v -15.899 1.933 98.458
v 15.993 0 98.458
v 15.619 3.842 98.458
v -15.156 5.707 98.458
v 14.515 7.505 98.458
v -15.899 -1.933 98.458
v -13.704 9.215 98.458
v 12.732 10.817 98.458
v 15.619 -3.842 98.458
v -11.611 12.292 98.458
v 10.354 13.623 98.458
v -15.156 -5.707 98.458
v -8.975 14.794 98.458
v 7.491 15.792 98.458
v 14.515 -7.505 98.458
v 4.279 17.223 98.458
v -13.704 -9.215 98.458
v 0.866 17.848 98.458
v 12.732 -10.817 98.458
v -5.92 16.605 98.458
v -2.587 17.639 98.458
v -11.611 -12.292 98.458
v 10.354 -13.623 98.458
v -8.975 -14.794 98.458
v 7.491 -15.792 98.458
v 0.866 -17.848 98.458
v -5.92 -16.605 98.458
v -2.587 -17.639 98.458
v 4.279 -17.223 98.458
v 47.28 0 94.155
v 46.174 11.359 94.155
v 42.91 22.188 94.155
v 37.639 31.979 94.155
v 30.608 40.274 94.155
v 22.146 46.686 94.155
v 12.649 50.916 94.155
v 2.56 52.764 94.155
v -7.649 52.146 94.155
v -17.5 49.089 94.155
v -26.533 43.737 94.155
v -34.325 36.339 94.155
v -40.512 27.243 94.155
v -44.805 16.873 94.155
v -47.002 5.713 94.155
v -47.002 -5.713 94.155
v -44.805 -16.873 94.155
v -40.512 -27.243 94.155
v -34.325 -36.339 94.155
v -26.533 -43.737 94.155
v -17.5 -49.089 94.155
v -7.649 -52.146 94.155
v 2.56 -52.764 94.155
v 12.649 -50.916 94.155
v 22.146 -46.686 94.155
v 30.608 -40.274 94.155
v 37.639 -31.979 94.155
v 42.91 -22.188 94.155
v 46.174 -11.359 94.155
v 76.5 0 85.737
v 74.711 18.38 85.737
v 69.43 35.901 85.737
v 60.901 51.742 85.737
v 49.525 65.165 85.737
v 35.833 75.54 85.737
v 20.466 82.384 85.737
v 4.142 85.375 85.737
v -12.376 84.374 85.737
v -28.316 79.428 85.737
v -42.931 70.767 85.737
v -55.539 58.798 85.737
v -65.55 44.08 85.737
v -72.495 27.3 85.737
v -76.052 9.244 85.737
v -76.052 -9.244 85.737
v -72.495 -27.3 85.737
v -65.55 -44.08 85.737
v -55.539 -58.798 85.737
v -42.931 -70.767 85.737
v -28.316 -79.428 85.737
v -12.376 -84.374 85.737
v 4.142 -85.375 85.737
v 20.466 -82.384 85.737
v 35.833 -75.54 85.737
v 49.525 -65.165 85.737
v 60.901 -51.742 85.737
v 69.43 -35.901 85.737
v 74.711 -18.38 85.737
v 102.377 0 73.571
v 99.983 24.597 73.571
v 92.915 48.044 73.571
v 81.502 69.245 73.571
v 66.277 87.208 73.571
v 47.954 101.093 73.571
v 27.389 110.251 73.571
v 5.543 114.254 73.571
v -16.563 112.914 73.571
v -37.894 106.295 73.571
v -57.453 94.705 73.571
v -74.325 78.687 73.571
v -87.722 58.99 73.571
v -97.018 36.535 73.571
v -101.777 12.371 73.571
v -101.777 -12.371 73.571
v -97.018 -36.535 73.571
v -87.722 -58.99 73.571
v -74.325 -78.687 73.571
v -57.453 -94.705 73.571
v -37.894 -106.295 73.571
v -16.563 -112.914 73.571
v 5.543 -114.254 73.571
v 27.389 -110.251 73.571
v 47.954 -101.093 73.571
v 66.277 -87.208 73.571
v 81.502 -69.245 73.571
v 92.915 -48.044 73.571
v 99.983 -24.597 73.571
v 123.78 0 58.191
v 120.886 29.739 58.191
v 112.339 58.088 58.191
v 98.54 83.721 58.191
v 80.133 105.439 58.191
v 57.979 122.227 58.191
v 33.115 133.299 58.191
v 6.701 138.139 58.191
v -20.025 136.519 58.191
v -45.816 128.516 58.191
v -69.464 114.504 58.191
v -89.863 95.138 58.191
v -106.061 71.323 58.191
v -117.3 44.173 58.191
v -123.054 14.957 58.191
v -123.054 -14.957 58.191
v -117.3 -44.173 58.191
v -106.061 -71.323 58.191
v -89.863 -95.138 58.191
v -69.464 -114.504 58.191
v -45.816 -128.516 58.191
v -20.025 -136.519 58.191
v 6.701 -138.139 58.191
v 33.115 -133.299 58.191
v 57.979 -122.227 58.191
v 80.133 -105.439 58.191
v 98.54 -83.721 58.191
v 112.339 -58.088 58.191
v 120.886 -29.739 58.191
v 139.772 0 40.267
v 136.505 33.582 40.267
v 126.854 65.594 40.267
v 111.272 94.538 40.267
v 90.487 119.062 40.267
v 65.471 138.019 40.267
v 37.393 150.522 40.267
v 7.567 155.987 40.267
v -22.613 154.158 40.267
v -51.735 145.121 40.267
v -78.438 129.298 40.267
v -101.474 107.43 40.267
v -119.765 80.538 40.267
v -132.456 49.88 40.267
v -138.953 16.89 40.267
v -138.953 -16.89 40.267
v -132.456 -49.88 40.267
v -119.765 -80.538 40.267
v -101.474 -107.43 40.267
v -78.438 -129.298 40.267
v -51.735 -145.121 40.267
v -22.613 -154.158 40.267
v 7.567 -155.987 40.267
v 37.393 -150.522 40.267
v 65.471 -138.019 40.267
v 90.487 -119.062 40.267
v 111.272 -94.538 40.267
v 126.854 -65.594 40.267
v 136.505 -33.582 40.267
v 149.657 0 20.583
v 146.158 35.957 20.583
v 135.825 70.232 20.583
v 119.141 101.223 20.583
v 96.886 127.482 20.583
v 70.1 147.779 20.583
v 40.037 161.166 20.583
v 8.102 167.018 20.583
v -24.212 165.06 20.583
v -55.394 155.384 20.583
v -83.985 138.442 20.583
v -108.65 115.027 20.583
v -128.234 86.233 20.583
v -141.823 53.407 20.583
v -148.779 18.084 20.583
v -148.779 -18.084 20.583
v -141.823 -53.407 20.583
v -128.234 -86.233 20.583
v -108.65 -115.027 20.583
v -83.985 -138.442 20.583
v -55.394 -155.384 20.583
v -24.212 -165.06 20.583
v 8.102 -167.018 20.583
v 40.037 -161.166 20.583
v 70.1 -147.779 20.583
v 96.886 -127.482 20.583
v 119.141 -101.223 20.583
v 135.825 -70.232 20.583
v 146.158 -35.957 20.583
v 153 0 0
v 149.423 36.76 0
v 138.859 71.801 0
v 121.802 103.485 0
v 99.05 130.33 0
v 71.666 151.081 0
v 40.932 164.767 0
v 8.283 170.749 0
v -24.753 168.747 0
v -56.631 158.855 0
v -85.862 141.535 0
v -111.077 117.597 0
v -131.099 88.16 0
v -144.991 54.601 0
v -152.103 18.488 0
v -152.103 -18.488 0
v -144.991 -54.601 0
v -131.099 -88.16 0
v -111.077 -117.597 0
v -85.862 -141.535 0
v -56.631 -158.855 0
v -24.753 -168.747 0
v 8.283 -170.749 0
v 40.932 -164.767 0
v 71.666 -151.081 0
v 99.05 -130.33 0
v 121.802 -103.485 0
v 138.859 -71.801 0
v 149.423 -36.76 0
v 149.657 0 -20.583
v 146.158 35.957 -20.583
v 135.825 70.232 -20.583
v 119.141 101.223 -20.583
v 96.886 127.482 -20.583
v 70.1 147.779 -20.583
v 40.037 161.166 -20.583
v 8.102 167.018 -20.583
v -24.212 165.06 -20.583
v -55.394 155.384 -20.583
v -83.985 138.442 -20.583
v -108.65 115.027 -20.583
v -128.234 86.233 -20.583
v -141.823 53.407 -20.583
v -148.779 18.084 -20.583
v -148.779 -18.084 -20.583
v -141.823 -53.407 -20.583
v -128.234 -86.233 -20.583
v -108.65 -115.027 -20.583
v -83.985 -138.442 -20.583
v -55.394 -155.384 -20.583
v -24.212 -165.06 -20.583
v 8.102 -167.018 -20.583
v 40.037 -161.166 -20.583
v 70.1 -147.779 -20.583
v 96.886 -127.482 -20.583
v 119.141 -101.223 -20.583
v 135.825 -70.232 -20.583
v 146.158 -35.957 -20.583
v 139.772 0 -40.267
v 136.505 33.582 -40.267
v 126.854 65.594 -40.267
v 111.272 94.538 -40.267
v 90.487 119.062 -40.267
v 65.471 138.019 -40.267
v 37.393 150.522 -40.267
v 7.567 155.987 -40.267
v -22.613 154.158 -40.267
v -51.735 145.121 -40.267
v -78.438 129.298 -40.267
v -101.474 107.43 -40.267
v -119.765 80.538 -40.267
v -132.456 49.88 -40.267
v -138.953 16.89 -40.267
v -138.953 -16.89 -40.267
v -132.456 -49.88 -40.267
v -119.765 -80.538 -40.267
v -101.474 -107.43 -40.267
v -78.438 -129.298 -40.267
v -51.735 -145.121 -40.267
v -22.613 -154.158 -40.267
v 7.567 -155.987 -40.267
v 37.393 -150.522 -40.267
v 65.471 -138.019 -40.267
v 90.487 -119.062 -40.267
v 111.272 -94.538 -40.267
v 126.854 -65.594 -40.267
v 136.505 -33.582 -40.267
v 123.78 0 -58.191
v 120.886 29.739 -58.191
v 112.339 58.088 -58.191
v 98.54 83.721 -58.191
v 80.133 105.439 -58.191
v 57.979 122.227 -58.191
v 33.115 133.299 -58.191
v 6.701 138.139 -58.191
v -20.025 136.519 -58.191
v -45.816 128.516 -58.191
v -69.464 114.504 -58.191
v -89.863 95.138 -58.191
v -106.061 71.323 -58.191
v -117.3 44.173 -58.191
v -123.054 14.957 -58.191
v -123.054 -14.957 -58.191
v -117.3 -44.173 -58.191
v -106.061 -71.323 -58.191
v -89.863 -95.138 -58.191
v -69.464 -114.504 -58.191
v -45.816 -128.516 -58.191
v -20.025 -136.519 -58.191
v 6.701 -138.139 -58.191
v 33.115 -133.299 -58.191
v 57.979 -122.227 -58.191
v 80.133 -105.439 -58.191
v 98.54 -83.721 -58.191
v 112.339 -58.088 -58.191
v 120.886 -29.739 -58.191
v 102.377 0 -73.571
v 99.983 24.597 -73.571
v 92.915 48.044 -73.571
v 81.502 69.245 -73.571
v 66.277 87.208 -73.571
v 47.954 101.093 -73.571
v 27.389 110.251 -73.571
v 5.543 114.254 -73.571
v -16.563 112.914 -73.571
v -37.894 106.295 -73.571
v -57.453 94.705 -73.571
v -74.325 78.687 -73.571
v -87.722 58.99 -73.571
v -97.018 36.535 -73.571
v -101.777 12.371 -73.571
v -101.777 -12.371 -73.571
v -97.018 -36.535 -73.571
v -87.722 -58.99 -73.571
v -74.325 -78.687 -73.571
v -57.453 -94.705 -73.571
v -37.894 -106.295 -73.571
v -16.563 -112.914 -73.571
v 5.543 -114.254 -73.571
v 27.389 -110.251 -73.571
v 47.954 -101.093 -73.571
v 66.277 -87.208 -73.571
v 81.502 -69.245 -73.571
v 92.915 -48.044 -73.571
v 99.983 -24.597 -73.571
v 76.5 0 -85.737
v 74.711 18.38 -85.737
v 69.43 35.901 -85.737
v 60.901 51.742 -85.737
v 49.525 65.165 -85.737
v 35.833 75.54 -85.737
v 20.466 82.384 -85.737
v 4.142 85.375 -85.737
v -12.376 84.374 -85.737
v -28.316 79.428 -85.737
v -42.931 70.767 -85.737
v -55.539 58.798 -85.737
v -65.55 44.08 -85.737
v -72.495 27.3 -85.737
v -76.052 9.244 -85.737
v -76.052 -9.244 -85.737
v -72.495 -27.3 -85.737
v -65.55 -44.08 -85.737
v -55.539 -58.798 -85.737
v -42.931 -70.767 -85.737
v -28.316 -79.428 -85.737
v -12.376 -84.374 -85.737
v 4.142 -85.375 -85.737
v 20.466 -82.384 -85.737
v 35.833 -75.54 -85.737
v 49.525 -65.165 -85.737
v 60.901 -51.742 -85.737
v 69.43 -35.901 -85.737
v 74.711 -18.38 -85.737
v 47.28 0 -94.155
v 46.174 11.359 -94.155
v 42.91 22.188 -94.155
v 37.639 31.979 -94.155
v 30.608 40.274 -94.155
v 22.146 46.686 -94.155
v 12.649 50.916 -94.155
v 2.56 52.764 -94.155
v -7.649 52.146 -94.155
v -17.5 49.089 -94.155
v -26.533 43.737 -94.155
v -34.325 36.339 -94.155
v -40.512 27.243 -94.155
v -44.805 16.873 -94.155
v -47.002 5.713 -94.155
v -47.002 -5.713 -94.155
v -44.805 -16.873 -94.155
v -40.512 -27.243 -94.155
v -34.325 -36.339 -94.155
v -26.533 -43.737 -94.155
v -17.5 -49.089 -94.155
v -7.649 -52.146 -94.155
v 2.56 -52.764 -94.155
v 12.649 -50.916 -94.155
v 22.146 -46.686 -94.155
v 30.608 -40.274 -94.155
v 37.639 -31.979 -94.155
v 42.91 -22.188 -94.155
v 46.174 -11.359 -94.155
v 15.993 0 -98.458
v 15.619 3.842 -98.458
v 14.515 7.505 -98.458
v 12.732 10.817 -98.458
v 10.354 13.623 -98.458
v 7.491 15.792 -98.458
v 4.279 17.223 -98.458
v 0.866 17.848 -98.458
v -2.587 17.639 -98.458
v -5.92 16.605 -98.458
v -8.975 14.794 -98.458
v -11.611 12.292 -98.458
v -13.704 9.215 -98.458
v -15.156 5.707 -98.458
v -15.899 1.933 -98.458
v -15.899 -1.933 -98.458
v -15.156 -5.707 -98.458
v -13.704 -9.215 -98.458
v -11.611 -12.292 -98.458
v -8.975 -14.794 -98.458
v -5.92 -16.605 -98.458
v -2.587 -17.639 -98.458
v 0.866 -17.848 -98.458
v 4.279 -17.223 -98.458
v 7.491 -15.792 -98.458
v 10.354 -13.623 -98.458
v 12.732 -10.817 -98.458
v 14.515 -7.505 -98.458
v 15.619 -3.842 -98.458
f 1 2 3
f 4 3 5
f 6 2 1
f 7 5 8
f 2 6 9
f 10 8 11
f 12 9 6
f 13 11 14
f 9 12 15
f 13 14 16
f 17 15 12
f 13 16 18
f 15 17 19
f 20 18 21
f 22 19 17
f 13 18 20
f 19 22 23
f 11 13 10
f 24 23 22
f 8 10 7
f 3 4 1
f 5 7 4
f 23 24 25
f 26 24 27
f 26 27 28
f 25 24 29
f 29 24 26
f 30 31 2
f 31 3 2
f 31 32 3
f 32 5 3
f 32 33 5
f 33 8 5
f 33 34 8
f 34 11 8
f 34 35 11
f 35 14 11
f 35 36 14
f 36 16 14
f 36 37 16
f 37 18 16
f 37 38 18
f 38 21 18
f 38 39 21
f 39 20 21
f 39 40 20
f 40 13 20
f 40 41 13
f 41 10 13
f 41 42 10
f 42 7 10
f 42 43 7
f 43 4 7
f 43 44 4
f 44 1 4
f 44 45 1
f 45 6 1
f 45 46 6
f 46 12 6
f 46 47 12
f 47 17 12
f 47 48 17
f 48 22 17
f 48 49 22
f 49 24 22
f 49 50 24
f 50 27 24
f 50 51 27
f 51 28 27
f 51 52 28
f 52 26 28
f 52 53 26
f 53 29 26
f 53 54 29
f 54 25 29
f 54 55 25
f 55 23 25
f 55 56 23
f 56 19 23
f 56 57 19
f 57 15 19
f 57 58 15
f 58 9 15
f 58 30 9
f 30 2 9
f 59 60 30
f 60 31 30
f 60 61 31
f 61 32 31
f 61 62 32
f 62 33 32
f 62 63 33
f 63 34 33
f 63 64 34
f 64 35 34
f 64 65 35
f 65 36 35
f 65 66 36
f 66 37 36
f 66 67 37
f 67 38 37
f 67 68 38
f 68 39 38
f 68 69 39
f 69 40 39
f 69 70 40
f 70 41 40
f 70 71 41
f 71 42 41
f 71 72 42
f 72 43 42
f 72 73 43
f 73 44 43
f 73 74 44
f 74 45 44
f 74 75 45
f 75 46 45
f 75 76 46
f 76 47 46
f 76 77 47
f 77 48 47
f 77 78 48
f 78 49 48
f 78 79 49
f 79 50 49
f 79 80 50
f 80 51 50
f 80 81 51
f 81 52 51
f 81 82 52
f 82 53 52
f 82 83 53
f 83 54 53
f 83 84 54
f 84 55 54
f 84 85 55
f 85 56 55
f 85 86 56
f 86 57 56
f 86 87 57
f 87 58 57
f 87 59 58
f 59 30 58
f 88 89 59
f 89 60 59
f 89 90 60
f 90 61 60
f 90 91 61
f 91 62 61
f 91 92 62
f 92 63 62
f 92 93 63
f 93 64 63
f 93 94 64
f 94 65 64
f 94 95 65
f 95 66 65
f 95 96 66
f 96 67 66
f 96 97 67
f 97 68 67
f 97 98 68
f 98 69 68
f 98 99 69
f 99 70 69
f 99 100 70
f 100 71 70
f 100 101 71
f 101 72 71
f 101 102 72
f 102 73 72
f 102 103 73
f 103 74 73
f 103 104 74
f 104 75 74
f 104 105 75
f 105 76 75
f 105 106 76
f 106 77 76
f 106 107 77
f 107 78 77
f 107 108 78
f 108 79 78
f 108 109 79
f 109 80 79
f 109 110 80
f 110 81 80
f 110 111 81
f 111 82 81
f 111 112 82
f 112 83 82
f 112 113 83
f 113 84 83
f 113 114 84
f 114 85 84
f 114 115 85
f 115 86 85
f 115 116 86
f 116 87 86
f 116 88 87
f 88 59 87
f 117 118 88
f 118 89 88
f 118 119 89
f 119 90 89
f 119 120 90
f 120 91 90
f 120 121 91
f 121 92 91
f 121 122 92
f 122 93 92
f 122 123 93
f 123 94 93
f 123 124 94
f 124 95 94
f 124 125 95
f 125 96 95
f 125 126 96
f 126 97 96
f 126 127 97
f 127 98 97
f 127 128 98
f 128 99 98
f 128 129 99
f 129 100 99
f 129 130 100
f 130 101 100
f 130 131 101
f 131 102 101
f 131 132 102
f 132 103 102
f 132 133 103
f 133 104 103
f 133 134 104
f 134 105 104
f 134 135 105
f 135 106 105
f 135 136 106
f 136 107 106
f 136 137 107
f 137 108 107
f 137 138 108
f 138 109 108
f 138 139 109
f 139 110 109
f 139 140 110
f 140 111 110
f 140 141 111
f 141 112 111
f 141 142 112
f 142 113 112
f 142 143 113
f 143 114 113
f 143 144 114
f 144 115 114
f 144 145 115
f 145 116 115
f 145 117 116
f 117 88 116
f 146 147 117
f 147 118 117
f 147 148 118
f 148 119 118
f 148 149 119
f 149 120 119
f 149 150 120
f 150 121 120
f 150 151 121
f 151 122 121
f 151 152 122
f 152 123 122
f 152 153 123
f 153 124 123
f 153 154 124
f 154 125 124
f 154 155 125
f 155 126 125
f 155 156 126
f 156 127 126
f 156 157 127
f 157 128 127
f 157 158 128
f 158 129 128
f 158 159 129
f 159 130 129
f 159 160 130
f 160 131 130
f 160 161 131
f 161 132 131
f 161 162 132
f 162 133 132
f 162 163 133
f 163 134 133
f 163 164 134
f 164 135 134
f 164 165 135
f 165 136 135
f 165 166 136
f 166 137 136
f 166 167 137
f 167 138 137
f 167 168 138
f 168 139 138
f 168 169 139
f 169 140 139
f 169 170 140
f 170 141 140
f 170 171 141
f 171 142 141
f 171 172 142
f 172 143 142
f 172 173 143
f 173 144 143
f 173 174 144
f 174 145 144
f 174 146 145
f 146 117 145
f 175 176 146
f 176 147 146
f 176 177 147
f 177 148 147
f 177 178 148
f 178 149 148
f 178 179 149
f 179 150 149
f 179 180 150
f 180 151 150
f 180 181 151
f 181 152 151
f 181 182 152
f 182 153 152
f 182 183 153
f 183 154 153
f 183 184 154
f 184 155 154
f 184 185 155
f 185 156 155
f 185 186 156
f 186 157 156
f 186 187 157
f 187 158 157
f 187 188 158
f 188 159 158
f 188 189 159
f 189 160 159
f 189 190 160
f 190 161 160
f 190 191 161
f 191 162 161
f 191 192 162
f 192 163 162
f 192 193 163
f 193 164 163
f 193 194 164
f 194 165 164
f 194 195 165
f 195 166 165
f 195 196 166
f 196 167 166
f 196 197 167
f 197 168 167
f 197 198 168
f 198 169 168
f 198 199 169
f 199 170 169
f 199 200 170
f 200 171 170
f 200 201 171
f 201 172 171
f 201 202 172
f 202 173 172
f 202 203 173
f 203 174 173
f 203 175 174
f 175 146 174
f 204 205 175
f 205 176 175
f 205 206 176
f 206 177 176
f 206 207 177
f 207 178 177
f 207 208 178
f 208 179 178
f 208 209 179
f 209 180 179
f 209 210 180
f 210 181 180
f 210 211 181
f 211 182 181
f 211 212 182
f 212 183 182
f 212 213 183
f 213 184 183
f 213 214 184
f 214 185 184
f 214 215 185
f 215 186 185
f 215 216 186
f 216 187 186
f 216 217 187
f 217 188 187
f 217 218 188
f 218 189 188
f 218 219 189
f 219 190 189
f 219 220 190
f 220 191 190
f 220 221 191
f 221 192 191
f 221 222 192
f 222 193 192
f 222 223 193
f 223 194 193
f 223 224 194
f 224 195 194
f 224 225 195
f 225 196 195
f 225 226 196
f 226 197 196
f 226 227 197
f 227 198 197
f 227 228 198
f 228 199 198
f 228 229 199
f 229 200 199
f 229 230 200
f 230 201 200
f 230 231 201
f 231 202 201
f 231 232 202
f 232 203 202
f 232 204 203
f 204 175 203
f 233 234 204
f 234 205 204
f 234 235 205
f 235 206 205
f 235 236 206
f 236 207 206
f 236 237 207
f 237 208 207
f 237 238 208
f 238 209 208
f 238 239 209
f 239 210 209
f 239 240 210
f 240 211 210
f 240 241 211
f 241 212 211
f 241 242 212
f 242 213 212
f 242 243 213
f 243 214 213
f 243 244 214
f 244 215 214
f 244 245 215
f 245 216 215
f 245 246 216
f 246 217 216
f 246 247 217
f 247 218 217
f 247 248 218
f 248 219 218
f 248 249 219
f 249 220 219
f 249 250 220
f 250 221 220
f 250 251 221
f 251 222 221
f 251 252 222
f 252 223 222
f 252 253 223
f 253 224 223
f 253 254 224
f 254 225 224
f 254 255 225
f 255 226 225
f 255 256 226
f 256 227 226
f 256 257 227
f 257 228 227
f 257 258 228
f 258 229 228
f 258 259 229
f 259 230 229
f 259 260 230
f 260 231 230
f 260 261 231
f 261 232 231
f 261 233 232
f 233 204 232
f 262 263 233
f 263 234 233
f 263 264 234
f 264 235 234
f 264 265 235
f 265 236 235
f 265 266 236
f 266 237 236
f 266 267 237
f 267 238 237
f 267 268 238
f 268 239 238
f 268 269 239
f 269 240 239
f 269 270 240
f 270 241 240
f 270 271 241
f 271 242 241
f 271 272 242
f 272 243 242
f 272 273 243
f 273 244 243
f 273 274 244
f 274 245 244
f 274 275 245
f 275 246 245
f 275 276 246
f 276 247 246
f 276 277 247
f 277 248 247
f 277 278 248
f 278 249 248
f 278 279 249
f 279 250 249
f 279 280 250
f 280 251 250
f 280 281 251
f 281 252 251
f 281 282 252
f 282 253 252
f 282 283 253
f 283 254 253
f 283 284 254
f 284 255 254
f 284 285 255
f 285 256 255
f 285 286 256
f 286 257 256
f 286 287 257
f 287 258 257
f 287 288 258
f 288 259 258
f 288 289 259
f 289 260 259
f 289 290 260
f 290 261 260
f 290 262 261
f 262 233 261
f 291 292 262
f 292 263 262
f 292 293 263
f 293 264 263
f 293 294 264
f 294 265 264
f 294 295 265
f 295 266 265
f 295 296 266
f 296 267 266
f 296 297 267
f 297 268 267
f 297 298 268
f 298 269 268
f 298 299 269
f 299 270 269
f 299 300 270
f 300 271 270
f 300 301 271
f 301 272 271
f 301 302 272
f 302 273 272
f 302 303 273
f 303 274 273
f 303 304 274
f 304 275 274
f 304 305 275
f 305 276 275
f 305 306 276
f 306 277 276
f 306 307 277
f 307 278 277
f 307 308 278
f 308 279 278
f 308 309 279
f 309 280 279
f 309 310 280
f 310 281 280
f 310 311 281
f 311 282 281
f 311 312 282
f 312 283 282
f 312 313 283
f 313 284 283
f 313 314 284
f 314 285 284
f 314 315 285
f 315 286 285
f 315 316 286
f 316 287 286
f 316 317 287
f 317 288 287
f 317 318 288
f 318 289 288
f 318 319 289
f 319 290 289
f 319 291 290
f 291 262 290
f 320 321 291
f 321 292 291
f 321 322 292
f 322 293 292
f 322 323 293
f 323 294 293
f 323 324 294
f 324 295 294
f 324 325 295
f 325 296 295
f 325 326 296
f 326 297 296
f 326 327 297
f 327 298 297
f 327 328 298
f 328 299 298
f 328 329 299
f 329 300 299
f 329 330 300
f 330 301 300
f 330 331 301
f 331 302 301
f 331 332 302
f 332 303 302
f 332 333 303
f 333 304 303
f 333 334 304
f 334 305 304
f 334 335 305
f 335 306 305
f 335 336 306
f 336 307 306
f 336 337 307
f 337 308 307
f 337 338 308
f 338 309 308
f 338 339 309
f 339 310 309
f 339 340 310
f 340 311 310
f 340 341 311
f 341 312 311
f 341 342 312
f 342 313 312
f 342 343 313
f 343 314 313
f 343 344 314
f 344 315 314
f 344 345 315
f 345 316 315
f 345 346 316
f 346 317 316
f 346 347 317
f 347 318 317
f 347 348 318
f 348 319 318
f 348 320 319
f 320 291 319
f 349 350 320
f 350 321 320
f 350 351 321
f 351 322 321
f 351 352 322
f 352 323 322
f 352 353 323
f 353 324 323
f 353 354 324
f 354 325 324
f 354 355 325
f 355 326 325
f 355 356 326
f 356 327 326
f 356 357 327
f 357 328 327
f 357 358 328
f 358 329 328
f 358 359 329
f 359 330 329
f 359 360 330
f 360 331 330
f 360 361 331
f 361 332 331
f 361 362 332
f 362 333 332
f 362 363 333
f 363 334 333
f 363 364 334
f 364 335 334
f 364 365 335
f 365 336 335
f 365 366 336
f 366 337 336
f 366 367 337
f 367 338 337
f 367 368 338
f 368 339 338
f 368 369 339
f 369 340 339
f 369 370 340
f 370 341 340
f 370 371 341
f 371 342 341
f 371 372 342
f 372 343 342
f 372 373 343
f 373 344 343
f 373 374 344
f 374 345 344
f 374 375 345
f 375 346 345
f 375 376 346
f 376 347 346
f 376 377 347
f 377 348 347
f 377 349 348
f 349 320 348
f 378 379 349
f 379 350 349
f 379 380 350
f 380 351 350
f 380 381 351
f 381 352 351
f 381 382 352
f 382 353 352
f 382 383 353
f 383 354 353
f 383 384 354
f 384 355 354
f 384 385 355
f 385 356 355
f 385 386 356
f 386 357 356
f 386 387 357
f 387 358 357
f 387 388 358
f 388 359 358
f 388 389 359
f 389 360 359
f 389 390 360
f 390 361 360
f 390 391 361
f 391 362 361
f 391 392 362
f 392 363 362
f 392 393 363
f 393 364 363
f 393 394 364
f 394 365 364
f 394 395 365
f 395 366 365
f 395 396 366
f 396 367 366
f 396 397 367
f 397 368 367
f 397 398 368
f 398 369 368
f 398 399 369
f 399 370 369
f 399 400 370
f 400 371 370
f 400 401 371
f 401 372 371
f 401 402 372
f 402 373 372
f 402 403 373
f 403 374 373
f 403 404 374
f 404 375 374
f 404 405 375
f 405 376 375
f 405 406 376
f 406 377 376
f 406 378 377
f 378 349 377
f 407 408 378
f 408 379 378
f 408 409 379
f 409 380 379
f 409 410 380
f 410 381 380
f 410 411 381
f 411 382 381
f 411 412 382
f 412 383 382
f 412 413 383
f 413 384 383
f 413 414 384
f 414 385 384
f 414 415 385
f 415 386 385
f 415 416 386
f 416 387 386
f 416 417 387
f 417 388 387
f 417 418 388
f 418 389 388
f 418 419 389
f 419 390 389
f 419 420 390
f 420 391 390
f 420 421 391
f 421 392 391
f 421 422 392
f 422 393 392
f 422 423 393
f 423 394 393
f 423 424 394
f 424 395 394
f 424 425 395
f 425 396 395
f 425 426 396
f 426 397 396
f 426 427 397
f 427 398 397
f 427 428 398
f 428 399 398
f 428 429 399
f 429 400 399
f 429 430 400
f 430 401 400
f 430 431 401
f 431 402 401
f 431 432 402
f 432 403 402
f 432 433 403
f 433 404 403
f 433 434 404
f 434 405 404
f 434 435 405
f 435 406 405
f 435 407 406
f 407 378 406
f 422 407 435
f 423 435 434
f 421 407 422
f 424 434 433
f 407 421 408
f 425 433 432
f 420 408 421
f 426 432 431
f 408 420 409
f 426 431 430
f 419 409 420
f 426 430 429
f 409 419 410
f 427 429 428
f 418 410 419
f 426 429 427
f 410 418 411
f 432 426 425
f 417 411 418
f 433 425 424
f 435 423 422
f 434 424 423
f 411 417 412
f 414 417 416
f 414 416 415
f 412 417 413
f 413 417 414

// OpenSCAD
// Generated by SolidPython 1.0.1 on 2020-07-29 00:46:53


scale(v = [17, 19, 11]) {
	sphere(r = 9);
}
/***********************************************
*********      SolidPython code:      **********
************************************************
 
# import packages: SolidPython
from solid import *
from solid.utils import *
from itertools import chain, combinations, permutations


class Resize:

    def __init__(self, scad_file):
        self.scad_file = scad_file
        #self.scad_file = import_scad(scad_file)
        # cone/cylinder param:
        self.r1 = 0
        self.r2 = 0
        self.h = 0
        # rectangular prism param:
        self.w = 0
        self.l = 0
        # ellipse param:
        self.r = 0

    # import OpenScad code (file name corresponds to shape)


    # classify shape + parameters
    def assign(self, param1, param2, param3):
        if self.scad_file == 'cone.scad':
            self.r1 = param1
            self.r2 = param2
            self.h = param3
        elif self.scad_file == 'cylinder.scad':
            self.r1 = param1
            self.r2 = param2
            self.h = param3
        elif self.scad_file == 'rectangularPrism.scad':
            self.h = param1
            self.l = param2
            self.w = param3
        else:
            self.r = param1
            self.h = param2

    # resize parameters
    def iterate(self):
        x = range(3, 20, 2)
        i = 1
        if self.scad_file == 'cone.scad':
            tempList = list(permutations(x, 2))
            for temp in tempList:
                param1 = temp[0]
                param2 = temp[1]
                filepath = 'produced_scad_files/' + 'cone' + str(param1) + '_' + str(param2) + '_' + '.scad'
                scad_render_to_file(cylinder(h=param1, r1=param2, r2=0), filepath)

        elif self.scad_file == 'cylinder.scad':
            tempList = list(permutations(x, 3))
            for temp in tempList:
                param1 = temp[0]
                param2 = temp[1]
                filepath = 'produced_scad_files/' + 'cylinder' + str(param1) + '_' + str(param2) + '_' + '.scad'
                scad_render_to_file(cylinder(h=param1, r1=param2, r2=param2), filepath)

        elif self.scad_file == 'rectangularPrism.scad':
            tempList = list(permutations(x, 3))
            for temp in tempList:
                param1 = temp[0]
                param2 = temp[1]
                param3 = temp[2]
                filepath = 'produced_scad_files/' + 'rectangularPrism' + str(param1) + '_' + str(param2) + '_' + str(
                    param3) + '.scad'
                scad_render_to_file(cube(size=(param1, param2, param3)), filepath)

        elif self.scad_file == 'ellipse.scad':
            tempList = list(permutations(x, 4))
            for temp in tempList:
                param1 = temp[0]
                param2 = temp[1]
                param3 = temp[2]
                param4 = temp[3]
                filepath = 'produced_scad_files/' + 'ellipse' + str(param1) + '_' + str(param2) + '_' + str(param3) + '_' + str(param4) + '.scad'
                scad_render_to_file(scale([param1, param2, param3])(sphere(r=param4)), filepath)

    def render_to_scadfile(self):
        scad_render_to_file(scad, 'example.scad') 
 
************************************************/
